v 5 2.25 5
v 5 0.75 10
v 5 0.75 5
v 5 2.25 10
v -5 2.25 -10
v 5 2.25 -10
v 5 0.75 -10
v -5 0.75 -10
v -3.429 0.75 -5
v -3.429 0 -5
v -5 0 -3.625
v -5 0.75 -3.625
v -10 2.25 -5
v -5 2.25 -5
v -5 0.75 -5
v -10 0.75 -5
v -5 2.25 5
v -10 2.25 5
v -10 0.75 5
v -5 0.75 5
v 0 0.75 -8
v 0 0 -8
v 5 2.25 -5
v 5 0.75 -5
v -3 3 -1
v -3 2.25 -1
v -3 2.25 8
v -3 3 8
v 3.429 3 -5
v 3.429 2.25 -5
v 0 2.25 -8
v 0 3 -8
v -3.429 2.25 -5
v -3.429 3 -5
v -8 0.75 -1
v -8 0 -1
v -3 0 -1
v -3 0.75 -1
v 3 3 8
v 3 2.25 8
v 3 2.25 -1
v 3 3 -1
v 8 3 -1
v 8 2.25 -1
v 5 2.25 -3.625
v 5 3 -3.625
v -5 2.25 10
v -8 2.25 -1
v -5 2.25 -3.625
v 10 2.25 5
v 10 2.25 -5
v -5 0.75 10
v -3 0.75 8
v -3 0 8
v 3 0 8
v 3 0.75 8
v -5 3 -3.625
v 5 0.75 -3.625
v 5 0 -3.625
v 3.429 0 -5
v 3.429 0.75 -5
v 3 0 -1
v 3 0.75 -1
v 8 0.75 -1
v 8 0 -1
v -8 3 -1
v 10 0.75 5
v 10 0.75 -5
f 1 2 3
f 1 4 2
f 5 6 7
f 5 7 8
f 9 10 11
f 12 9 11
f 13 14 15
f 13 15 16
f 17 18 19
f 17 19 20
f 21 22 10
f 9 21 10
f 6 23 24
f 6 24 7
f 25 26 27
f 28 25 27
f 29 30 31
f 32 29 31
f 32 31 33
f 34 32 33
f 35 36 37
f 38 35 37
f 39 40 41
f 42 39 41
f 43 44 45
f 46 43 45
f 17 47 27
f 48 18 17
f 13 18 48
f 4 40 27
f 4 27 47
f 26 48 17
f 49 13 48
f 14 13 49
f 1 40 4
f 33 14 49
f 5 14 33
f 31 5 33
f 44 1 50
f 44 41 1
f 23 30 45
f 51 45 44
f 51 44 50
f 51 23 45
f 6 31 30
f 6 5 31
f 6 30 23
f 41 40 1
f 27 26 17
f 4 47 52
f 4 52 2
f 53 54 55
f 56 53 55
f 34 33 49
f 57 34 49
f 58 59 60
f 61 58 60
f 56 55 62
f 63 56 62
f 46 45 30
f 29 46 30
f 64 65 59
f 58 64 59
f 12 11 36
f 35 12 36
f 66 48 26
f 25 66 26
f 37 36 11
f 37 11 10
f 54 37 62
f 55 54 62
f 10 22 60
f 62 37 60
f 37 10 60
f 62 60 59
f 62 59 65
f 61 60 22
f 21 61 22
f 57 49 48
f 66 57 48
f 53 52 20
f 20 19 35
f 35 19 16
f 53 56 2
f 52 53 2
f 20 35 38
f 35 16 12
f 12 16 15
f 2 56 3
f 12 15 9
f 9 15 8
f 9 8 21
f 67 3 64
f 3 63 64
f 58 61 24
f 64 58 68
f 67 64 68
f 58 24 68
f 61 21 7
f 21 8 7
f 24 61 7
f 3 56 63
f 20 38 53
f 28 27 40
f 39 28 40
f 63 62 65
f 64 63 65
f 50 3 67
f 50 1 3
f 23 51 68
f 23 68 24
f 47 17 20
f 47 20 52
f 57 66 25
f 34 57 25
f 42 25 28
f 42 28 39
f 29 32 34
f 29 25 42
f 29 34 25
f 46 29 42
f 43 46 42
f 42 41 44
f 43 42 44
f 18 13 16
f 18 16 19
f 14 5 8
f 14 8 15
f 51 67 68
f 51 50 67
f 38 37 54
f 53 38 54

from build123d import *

# Parameters (mm, degrees)
SKETCH1_W                = 6
SKETCH1_H                = 3
BOSS_EXTRUDE2_DEPTH      = 3
SKETCH4_W                = 2
SKETCH4_H                = 6
BOSS_EXTRUDE3_DEPTH      = 0.75
BOSS_EXTRUDE3_DEPTH_BACK = 0.75


with BuildPart() as part:
    # Sketch1 → Boss-Extrude2 (new body)
    with BuildSketch(Plane(origin=(0, 0, 0), x_dir=(1, 0, 0), z_dir=(0, 1, 0))):
        Polygon((-5, 3.625), (-5, 1), (-3, 1), (-3, -5), (3, -5), (3, 1), (5, 1), (5, 3.625), (3.428571429, 5), (-3.428571429, 5), align=None)
        with Locations((0, -6.5)):
            Rectangle(SKETCH1_W, SKETCH1_H)
        Polygon((-5, 3.625), (-8, 1), (-5, 1), align=None)
        Polygon((0, 8), (-3.428571429, 5), (3.428571429, 5), align=None)
        Polygon((8, 1), (5, 3.625), (5, 1), align=None)
    extrude(amount=BOSS_EXTRUDE2_DEPTH)

    # Sketch4 → Boss-Extrude3 (add, two sides)
    with BuildSketch(Plane(origin=(0, 1.5, 0), x_dir=(1, 0, 0), z_dir=(0, 1, 0))) as boss_extrude3_sk:
        Polygon((10, -5), (10, 5), (5, 5), (5, 3.625), (8, 1), (5, 1), (5, -5), align=None)
        with Locations((4, -2)):
            Rectangle(SKETCH4_W, SKETCH4_H)
        Polygon((3.428571429, 5), (5, 5), (5, 10), (-5, 10), (-5, 5), (-3.428571429, 5), (0, 8), align=None)
        Polygon((-5, 3.625), (-5, 5), (-10, 5), (-10, -5), (-5, -5), (-5, 1), (-8, 1), align=None)
        Polygon((-5, 3.625), (-3.428571429, 5), (-5, 5), align=None)
        Polygon((5, 3.625), (5, 5), (3.428571429, 5), align=None)
        with Locations((-4, -2)):
            Rectangle(SKETCH4_W, SKETCH4_H)
        Polygon((5, -10), (5, -5), (3, -5), (3, -8), (-3, -8), (-3, -5), (-5, -5), (-5, -10), align=None)
    extrude(amount=BOSS_EXTRUDE3_DEPTH)
    extrude(boss_extrude3_sk.sketch, amount=-BOSS_EXTRUDE3_DEPTH_BACK)


solid = part.part
